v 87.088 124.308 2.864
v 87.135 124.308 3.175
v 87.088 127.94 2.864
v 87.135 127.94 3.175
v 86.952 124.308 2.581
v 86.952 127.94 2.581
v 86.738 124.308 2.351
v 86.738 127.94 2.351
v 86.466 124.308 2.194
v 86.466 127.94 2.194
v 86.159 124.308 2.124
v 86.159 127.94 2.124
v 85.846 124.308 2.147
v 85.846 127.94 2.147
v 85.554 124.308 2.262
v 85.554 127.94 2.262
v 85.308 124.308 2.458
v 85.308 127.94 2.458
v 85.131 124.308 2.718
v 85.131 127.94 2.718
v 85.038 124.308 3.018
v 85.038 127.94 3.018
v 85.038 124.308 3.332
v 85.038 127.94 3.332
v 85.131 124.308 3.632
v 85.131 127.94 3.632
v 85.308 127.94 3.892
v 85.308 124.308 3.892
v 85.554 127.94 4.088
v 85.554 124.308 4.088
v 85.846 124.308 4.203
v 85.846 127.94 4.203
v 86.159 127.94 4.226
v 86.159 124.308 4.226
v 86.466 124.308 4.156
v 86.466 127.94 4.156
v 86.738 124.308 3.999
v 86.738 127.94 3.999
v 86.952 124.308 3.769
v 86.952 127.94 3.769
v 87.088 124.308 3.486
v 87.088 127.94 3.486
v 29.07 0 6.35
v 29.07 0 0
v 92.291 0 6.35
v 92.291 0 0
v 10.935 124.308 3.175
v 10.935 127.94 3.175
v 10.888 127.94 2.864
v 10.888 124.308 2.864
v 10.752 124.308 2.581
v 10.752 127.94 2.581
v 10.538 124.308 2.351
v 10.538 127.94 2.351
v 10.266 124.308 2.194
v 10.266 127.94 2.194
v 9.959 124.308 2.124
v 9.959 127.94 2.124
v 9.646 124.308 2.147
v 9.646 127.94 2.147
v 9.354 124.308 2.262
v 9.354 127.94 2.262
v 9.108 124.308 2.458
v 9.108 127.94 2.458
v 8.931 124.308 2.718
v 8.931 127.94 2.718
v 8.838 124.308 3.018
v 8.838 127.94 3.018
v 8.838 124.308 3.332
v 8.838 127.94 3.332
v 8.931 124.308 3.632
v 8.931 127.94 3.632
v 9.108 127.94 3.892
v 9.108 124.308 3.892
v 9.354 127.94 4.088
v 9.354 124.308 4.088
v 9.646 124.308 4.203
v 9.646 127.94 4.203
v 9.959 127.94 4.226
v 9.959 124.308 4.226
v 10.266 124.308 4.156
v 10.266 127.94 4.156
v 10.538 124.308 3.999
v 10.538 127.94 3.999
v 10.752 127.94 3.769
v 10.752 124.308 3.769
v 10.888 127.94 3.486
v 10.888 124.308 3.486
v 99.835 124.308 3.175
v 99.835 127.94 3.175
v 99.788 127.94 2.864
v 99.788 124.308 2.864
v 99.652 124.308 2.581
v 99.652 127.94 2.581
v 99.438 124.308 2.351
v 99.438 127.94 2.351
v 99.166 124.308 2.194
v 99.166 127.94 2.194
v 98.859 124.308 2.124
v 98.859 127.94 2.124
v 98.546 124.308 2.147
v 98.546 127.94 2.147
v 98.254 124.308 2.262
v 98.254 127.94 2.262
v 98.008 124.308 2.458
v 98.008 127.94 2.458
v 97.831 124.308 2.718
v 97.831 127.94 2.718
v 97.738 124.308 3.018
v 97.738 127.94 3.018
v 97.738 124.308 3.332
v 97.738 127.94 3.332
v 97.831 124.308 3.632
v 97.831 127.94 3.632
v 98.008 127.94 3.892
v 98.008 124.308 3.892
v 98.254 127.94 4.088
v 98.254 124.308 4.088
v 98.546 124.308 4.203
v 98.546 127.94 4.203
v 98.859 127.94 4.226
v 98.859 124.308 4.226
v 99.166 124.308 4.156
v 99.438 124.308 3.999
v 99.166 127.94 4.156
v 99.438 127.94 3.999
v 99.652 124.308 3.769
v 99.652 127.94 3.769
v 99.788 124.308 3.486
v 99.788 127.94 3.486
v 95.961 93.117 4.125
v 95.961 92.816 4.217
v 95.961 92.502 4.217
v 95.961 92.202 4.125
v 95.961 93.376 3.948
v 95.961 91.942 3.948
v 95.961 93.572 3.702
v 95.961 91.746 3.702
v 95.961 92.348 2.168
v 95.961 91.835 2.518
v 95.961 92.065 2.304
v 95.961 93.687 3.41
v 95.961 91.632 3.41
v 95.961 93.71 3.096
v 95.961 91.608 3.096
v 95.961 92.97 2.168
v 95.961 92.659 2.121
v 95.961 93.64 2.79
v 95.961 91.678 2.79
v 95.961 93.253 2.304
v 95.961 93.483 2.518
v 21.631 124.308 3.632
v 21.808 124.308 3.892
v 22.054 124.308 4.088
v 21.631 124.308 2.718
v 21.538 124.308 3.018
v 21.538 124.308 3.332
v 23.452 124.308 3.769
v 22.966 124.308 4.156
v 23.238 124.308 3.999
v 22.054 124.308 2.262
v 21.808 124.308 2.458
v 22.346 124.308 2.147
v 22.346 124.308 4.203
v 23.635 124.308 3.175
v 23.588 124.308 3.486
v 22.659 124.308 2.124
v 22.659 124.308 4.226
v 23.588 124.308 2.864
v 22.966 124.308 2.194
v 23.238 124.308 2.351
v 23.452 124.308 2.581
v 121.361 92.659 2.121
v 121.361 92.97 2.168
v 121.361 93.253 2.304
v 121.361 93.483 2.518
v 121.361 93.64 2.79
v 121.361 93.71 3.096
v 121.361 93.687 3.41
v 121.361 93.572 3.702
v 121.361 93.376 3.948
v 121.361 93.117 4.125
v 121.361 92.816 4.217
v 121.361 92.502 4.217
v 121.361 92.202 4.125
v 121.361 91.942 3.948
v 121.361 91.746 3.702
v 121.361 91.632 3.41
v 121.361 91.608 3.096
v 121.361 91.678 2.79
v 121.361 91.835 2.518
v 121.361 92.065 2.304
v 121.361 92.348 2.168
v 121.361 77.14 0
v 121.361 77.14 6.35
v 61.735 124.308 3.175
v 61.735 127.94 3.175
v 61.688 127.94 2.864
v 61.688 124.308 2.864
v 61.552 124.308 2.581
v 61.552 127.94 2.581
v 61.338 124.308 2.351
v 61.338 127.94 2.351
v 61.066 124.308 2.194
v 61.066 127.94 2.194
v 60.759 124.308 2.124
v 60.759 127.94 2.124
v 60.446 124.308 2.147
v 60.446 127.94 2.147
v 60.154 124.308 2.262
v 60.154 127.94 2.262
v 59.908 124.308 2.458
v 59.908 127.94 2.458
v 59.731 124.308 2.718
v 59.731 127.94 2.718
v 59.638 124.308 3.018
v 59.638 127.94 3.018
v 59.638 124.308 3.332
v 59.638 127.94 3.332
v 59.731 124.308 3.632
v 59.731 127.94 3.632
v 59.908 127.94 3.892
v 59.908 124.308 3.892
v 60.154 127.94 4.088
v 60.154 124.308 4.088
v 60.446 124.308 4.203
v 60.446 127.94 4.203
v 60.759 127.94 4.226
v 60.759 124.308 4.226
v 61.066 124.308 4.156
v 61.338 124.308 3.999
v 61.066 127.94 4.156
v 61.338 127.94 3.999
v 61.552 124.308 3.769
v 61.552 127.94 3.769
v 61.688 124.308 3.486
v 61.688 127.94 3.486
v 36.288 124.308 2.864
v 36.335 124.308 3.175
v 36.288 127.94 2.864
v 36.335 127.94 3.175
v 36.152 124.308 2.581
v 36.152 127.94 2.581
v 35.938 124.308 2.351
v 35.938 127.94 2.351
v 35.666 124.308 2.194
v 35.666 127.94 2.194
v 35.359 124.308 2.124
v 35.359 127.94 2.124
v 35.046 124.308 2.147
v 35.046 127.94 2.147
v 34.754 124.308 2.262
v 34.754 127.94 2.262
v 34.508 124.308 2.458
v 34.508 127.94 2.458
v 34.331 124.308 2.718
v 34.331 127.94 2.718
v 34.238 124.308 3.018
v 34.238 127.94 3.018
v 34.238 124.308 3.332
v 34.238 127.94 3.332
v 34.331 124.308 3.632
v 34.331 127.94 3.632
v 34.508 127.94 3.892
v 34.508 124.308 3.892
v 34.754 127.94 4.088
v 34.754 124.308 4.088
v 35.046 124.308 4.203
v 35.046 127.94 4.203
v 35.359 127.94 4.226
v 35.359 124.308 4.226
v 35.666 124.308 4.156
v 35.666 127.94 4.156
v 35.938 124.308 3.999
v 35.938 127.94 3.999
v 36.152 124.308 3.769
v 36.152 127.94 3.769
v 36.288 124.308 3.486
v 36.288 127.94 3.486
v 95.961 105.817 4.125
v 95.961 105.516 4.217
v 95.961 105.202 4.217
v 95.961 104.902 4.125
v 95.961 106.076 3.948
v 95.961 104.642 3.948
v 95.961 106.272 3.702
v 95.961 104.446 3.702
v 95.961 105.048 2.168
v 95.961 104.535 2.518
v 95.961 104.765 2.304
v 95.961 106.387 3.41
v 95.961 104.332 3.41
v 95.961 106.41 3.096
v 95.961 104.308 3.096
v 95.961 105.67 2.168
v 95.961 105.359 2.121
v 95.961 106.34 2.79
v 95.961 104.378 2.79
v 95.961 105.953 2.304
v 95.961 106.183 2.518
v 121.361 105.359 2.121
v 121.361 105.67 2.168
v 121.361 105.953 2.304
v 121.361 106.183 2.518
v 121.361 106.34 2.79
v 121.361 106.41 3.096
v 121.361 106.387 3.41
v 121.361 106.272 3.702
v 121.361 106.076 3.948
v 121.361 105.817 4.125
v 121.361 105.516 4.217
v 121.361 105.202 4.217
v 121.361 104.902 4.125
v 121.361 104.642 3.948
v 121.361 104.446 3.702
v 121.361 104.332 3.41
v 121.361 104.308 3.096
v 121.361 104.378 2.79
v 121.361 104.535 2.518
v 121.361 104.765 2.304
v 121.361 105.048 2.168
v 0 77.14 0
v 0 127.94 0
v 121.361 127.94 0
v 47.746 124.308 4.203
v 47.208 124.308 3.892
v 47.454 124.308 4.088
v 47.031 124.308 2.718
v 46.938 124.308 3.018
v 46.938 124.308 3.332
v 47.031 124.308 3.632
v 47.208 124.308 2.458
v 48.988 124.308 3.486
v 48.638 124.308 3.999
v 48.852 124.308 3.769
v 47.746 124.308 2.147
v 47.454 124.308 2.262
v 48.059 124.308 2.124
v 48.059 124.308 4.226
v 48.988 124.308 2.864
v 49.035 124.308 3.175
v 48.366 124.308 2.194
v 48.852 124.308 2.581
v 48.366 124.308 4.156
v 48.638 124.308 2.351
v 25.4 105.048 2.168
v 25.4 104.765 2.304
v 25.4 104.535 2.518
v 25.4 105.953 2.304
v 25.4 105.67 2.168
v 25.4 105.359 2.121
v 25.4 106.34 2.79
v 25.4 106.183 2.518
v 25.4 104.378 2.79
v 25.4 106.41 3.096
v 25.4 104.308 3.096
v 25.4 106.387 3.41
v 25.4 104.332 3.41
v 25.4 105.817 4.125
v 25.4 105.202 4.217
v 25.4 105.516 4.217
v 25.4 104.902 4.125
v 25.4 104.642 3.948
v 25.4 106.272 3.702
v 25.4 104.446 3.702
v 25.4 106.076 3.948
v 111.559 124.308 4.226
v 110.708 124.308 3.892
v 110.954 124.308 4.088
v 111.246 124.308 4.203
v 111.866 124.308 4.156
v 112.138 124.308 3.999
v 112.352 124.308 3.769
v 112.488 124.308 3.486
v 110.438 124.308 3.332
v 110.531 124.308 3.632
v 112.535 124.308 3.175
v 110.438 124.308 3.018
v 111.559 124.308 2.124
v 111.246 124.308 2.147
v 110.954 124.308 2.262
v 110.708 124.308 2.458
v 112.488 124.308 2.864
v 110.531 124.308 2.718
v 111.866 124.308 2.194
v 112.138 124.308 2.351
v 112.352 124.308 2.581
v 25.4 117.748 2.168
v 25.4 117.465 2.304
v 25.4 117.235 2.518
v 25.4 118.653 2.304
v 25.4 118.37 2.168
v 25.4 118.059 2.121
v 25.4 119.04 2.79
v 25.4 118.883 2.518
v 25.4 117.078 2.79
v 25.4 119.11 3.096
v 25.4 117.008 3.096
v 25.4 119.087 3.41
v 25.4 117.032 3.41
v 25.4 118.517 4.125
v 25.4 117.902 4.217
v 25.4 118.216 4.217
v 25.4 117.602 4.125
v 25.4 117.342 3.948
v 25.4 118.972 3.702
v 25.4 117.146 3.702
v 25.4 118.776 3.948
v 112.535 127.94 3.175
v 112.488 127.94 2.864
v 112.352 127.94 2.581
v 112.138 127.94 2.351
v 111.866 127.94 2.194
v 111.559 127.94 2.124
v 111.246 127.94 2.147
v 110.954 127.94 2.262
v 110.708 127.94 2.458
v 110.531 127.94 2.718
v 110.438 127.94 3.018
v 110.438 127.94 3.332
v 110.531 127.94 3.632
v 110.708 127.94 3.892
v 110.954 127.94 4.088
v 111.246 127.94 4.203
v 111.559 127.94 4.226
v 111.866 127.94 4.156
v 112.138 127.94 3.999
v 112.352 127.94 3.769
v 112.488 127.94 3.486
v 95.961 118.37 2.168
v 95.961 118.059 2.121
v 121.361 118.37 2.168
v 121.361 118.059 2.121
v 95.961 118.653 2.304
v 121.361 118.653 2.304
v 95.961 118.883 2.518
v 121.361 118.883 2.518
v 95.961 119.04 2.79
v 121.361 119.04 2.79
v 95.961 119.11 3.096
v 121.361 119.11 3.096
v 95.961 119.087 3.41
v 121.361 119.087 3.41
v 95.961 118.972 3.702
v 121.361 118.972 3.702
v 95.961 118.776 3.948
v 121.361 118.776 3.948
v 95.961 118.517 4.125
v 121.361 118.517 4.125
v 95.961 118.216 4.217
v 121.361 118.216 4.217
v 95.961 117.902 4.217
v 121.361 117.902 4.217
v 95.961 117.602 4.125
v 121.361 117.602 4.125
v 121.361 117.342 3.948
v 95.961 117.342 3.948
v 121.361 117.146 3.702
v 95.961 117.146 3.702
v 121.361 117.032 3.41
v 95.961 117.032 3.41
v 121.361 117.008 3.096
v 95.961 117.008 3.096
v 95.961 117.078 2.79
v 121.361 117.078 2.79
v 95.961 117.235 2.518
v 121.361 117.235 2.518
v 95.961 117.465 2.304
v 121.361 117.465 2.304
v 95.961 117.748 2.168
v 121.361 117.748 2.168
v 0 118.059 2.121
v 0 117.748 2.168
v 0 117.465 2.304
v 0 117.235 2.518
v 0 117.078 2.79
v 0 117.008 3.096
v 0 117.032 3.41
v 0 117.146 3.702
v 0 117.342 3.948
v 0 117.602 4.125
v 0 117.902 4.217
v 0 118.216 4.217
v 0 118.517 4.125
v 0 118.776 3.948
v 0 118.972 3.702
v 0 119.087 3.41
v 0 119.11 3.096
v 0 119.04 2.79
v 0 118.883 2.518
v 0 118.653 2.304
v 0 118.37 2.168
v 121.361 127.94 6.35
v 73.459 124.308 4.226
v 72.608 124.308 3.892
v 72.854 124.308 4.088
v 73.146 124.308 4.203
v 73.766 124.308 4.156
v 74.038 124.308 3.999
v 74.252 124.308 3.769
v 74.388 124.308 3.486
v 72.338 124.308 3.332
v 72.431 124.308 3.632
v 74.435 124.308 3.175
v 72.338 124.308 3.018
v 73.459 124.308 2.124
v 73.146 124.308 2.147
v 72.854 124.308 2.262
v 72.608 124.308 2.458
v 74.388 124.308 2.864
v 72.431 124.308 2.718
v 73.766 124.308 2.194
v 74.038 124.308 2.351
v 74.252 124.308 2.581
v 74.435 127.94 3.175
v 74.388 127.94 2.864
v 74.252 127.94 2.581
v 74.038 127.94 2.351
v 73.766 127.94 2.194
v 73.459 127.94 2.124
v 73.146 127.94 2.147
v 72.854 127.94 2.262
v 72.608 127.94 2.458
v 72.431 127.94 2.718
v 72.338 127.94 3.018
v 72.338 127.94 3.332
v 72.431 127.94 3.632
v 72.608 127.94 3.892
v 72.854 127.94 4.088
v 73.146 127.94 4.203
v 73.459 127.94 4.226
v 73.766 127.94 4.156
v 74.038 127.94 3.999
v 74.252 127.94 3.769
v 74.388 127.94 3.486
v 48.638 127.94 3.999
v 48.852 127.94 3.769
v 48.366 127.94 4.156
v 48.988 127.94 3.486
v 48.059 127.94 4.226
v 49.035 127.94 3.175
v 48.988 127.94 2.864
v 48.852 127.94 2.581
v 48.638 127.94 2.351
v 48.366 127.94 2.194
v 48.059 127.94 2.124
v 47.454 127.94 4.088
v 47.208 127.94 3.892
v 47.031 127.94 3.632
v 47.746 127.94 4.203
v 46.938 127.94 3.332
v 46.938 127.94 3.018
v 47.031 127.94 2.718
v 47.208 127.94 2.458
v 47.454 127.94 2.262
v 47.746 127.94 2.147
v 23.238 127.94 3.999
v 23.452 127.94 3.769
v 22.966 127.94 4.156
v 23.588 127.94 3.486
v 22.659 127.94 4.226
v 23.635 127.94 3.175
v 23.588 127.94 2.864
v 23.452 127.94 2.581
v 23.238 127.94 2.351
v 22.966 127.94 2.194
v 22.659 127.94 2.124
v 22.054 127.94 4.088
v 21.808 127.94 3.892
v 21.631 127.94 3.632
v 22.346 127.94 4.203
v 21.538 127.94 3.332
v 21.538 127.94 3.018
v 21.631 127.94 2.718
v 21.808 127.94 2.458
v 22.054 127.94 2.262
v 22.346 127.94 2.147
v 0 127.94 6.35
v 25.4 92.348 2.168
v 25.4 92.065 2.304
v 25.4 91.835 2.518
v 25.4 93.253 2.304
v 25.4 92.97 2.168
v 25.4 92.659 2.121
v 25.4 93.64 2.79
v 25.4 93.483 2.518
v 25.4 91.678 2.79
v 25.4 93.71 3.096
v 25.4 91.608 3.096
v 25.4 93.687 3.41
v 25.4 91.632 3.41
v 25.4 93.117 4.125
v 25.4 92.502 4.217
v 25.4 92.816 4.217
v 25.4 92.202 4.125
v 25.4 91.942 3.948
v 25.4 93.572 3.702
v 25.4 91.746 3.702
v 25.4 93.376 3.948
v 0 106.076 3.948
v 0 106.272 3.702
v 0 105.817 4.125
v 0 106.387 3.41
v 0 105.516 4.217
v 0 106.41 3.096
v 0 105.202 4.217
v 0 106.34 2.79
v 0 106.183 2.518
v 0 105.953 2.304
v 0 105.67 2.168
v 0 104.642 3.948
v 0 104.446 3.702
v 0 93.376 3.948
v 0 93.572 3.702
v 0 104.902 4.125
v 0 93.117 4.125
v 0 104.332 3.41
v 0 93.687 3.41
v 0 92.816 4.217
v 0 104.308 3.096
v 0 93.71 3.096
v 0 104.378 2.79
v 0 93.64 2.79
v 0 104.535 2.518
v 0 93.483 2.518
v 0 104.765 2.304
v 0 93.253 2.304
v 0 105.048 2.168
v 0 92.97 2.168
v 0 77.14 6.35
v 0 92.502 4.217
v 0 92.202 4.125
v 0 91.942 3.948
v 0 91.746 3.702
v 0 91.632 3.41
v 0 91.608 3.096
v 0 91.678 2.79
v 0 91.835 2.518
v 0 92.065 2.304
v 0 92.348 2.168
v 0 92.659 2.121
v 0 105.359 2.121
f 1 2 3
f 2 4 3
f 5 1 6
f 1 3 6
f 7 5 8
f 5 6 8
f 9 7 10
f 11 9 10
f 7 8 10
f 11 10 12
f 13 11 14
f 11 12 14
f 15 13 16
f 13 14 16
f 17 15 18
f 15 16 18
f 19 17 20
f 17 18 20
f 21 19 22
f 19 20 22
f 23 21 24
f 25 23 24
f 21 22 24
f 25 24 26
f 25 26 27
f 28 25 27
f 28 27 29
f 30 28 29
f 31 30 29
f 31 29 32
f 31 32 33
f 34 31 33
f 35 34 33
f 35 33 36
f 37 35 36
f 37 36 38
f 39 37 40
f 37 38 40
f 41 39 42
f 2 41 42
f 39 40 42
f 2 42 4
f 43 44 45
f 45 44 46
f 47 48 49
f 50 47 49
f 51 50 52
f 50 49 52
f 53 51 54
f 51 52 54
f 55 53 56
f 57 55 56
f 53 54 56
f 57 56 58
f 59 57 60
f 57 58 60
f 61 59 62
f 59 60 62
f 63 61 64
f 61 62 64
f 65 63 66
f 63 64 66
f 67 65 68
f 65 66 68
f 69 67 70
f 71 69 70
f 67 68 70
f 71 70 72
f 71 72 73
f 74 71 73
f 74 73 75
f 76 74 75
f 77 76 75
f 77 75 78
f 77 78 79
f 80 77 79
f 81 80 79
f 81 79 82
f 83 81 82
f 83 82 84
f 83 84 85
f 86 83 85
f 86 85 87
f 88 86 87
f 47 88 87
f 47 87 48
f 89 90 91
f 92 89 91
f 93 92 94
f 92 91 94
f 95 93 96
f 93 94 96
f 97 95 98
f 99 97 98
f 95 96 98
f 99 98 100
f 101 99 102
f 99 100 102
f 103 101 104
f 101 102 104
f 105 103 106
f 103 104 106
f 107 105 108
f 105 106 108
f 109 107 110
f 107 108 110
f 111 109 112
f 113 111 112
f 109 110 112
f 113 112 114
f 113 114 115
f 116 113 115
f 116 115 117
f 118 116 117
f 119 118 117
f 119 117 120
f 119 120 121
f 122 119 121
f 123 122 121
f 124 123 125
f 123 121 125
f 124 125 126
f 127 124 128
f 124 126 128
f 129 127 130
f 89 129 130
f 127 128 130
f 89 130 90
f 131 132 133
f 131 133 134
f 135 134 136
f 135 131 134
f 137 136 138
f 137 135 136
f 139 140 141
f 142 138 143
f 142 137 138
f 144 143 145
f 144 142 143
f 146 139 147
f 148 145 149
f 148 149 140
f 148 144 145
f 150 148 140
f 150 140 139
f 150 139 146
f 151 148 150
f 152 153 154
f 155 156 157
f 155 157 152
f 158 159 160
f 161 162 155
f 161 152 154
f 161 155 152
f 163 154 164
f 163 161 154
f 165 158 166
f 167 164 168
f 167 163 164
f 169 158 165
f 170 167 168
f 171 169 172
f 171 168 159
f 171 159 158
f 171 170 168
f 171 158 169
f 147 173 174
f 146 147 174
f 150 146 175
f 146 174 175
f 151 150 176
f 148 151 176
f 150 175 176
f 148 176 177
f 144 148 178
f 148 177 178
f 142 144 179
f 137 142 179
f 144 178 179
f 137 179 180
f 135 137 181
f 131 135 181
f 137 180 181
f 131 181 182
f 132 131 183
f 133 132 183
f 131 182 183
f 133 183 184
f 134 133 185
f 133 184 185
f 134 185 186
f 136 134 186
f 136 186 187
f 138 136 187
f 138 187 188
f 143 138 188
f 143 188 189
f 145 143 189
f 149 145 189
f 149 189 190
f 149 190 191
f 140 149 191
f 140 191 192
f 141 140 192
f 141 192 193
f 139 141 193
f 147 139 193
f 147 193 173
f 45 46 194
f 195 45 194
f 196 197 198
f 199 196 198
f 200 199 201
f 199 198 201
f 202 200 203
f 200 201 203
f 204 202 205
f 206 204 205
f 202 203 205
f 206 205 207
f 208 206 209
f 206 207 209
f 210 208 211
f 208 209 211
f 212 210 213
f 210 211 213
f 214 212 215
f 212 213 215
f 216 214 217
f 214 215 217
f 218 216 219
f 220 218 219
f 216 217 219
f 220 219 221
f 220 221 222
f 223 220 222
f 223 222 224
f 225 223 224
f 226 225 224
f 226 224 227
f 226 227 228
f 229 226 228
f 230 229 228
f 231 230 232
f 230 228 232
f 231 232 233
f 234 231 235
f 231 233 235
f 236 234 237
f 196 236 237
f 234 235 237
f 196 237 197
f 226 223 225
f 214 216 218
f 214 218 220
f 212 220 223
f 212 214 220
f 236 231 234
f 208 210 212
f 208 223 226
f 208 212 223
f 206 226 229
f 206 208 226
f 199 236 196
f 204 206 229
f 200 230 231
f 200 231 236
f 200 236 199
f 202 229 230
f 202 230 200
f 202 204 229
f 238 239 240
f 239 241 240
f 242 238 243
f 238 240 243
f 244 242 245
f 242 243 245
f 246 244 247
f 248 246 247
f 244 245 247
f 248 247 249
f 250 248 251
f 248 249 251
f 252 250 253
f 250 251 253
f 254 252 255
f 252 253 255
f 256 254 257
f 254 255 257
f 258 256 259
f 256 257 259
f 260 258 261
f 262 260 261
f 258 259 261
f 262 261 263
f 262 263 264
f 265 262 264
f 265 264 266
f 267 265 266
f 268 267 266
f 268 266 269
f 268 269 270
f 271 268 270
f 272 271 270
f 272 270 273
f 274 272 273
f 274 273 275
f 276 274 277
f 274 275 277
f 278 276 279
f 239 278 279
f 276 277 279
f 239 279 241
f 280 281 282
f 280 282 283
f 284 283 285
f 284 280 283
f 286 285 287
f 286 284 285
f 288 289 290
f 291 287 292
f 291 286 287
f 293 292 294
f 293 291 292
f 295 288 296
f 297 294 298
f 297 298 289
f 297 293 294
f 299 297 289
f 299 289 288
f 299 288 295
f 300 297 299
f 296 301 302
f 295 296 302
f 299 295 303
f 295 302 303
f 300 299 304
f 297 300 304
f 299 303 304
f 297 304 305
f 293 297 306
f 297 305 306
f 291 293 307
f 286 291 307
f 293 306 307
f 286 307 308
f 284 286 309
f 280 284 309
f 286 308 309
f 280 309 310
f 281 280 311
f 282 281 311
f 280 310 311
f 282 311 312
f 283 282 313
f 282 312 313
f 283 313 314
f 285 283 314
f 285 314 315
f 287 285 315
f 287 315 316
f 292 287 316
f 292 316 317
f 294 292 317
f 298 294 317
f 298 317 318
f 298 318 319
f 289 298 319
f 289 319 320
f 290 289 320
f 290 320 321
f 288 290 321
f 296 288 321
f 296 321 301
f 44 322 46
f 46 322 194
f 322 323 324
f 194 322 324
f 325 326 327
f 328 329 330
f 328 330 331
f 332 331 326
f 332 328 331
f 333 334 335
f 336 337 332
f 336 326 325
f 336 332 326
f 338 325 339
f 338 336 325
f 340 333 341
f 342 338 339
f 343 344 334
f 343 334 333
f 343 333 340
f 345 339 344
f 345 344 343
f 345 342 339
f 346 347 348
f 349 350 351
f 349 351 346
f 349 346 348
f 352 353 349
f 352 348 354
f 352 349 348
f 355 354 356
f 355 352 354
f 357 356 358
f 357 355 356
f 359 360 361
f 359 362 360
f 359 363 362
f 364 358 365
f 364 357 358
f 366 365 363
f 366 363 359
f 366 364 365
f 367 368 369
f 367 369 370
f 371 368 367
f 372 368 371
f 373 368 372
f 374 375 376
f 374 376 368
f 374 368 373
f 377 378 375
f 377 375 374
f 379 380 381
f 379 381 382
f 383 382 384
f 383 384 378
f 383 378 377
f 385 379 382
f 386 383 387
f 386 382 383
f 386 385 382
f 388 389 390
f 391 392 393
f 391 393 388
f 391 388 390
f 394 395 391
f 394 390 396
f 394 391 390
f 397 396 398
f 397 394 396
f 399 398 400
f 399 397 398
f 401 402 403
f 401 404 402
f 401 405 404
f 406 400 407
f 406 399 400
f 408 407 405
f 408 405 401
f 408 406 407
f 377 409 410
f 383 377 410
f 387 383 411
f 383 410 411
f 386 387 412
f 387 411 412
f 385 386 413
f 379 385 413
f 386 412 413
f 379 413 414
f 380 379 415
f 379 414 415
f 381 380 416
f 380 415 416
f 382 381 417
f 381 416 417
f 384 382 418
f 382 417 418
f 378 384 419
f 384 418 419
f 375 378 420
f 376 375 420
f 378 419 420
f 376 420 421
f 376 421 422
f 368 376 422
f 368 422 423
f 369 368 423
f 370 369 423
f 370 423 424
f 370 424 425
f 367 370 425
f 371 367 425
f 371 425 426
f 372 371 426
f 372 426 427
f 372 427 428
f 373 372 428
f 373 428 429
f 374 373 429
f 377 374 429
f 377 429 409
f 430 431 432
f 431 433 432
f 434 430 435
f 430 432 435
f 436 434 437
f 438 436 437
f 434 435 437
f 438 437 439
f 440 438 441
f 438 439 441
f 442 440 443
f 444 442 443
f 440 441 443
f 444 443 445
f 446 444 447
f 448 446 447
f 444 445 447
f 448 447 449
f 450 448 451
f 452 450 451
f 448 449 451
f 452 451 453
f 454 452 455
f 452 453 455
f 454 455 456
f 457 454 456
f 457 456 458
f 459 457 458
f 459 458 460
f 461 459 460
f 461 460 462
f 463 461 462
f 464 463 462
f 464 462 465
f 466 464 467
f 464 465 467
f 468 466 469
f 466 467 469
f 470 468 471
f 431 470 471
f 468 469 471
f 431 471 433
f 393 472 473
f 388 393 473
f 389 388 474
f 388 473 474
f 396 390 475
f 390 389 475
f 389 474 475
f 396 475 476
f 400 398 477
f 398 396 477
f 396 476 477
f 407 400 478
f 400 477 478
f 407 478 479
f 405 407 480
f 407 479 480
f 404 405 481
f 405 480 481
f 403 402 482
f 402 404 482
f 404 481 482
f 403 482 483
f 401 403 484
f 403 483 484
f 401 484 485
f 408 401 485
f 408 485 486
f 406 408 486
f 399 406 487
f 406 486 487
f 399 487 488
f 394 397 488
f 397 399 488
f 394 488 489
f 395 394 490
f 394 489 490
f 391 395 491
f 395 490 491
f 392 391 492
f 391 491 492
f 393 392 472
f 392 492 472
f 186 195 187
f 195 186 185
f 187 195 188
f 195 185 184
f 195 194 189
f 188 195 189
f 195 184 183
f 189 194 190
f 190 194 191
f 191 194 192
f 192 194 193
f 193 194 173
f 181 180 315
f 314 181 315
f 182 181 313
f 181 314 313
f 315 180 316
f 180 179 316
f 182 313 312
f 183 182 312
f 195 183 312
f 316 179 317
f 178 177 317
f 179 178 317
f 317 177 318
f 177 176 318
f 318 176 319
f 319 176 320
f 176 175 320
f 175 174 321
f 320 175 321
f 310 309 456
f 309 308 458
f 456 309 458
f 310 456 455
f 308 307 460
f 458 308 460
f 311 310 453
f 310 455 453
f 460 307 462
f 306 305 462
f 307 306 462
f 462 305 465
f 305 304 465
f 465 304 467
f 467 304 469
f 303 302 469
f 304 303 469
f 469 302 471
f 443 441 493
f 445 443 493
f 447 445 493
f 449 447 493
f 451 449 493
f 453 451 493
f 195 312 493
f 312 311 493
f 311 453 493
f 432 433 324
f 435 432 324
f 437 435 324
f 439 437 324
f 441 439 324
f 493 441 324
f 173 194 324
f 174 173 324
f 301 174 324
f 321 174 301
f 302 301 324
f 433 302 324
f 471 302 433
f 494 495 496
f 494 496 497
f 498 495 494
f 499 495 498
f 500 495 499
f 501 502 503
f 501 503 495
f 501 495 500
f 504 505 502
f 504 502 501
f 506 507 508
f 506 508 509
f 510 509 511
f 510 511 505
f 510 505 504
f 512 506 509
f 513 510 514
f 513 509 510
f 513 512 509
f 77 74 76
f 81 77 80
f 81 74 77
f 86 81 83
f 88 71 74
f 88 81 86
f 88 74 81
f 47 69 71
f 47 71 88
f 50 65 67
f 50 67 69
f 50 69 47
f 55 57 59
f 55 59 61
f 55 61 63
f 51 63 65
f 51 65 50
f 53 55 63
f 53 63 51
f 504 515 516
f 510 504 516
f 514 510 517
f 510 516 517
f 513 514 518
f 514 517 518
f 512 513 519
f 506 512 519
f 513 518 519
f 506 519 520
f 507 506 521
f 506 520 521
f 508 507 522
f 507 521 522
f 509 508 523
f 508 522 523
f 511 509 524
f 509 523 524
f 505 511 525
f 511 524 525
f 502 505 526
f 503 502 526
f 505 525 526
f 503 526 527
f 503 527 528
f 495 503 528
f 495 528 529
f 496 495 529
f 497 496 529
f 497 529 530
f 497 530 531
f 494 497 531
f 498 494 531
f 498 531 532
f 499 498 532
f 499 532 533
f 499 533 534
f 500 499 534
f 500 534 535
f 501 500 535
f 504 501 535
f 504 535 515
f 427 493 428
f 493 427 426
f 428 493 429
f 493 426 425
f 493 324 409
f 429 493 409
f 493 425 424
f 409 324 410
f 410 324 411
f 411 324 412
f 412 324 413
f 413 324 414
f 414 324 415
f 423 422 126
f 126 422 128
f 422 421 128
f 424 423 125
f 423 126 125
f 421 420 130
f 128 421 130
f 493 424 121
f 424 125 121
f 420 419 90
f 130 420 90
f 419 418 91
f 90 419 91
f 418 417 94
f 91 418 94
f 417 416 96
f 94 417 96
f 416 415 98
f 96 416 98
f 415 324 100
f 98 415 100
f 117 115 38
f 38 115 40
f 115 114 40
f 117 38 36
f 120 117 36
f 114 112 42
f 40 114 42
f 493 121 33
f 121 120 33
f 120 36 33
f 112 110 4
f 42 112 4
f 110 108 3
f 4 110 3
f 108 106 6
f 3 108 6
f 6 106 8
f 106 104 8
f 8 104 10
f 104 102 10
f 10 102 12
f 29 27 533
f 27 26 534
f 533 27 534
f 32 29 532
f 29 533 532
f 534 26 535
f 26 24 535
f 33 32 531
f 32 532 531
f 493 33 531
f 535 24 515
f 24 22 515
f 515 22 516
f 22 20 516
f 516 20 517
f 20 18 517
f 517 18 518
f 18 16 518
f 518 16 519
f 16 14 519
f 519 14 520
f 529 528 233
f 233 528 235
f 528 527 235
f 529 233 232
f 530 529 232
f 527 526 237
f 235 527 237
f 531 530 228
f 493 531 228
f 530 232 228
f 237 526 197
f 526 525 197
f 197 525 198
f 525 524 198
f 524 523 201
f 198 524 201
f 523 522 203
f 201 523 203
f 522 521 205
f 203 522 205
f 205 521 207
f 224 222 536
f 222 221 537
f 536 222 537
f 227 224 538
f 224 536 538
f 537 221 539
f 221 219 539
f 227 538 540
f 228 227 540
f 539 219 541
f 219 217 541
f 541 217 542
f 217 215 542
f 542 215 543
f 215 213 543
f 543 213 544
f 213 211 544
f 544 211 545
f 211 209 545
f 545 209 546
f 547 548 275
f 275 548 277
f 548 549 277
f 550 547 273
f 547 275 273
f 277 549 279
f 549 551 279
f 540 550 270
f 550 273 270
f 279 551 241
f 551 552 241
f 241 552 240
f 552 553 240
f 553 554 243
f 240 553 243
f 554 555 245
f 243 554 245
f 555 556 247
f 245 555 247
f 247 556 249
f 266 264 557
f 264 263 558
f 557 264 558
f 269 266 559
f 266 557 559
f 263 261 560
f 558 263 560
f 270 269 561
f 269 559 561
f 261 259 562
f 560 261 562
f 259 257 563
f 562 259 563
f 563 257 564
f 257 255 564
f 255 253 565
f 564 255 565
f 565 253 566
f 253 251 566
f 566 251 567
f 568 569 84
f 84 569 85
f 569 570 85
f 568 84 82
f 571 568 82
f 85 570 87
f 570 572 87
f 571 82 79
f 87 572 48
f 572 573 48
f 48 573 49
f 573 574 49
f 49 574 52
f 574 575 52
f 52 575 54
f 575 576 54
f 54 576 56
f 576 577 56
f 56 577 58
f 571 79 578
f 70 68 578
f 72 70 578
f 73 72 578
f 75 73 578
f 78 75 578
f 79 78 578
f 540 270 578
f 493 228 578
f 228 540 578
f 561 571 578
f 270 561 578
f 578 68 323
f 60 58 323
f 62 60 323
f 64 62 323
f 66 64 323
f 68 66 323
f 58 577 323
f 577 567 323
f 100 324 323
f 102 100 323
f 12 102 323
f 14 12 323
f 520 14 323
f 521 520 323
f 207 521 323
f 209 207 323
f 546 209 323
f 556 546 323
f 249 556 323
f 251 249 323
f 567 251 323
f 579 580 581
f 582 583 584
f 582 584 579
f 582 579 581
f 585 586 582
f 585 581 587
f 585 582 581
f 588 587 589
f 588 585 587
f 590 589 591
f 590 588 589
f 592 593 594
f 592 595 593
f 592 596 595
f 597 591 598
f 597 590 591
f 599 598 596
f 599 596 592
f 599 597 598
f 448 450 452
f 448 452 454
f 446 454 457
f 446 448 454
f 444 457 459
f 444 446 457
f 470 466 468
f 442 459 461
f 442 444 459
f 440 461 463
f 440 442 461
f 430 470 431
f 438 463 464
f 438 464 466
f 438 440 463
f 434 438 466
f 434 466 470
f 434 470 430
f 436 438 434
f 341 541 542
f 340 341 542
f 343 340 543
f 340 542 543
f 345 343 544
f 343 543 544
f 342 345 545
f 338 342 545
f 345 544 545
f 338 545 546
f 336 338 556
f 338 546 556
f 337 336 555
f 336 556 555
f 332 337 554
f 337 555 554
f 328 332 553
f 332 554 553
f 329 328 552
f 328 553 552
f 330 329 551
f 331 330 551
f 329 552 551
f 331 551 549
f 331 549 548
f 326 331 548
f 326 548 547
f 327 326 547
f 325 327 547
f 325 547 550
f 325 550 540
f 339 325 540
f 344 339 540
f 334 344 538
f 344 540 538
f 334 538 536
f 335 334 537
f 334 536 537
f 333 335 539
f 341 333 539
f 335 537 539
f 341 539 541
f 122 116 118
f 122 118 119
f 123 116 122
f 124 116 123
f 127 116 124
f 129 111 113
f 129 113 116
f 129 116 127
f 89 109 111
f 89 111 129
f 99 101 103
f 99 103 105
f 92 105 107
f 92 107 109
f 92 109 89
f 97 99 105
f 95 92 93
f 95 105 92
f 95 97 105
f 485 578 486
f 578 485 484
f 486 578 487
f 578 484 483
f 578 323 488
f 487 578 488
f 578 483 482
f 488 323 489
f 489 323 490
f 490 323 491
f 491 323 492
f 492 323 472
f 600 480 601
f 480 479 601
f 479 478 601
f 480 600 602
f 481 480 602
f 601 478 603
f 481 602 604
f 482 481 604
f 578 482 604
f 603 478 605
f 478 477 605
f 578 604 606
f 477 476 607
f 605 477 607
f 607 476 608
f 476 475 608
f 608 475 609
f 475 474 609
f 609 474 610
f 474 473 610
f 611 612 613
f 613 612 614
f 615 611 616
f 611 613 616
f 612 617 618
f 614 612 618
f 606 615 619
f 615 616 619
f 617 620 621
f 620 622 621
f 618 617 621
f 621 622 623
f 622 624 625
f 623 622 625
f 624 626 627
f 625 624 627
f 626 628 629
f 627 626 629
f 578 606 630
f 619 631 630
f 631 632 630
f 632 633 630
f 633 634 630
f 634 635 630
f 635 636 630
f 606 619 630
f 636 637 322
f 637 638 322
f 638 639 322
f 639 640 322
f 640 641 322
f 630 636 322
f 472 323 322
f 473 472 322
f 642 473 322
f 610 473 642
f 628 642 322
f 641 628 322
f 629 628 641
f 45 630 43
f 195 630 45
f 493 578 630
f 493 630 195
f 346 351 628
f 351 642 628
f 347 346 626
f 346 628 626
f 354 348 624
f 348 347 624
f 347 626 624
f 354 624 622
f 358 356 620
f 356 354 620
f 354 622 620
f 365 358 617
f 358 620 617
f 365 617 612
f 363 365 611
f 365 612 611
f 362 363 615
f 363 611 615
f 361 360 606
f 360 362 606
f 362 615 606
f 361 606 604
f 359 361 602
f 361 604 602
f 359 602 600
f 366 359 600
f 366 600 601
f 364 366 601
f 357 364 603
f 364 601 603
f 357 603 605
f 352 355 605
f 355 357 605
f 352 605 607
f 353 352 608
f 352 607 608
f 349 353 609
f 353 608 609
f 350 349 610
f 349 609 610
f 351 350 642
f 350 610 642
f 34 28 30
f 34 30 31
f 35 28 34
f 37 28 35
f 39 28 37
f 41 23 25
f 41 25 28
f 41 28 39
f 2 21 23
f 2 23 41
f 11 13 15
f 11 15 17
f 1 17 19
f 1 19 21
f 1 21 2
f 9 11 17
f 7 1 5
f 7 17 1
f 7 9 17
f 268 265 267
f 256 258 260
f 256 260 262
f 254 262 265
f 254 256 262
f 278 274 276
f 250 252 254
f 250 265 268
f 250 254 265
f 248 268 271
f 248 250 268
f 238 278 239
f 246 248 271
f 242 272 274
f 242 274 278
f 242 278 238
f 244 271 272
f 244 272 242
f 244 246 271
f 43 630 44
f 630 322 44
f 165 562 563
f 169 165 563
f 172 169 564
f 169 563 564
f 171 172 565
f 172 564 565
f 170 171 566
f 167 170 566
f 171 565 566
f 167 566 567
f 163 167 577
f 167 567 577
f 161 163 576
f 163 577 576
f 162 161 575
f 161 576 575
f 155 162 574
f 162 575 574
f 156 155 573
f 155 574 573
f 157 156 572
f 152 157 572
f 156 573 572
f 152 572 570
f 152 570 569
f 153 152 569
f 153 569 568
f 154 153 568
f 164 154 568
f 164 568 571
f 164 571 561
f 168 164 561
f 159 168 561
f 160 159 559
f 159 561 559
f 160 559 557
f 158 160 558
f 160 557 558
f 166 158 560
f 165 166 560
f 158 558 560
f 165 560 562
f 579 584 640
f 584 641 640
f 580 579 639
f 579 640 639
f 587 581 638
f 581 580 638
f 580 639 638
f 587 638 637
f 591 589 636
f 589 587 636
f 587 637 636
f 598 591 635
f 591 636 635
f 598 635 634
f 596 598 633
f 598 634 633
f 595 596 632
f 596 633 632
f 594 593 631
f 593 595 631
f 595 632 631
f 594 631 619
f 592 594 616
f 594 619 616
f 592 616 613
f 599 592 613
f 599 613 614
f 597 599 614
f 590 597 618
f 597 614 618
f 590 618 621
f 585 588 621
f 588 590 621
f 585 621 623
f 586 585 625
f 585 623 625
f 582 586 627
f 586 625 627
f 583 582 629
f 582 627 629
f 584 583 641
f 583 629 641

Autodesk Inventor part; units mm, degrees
ref_plane "YZ Plane" through (0, 0, 0) normal (1, 0, 0) x (0, 1, 0)
ref_plane "XZ Plane" through (0, 0, 0) normal (0, 1, 0) x (-1, 0, 0)
sketch "Sketch1" plane through (0, 0, 0) normal (0, 0, 1) x (1, 0, 0)
  line L0 (29.0703, 0) -> (121.3612, 0)
  line L1 (121.3612, 0) -> (121.3612, 127.9398)
  line L2 (121.3612, 127.9398) -> (0, 127.9398)
  line L3 (0, 127.9398) -> (0, 13.0299)
  line L4 (0, 77.1398) -> (121.3612, 77.1398) construction
  line L5 (29.0703, 0) -> (29.0703, 26.0597) construction
  line L6 (92.2909, 0) -> (92.2909, 26.0597) construction
  line L7 (29.0703, 13.0299) -> (0, 13.0299) construction
  line L8 (92.2909, 13.0299) -> (121.3612, 13.0299) construction
  line L9 (0, 77.1398) -> (29.0703, 0)
  line L10 (92.2909, 0) -> (121.3612, 77.1398)
  point P0 (0, 0)
  dimension "d0" = 121.3612
  dimension "d1" = 127.9398
  dimension "d2" = 50.8
  dimension "d3" = 63.2206
extrude "Extrusion1" add sketch "Sketch1" along normal blind 6.35 contours L9 L3 L2 L1 L10 L0
sketch "Sketch2" plane through (0, 127.9398, 0) normal (0, 1, 0) x (1, 0, 0)
  line L0 (121.3612, 0) -> (0, 0) construction
  line L1 (0, 0) -> (0, -6.35) construction
  line L2 (121.3612, -6.35) -> (0, -6.35) construction
  line L3 (121.3612, 0) -> (121.3612, -6.35) construction
  line L4 (121.3612, -6.35) -> (0, -6.35) construction
  line L5 (60.6806, -6.35) -> (60.6806, 0) construction
  line L6 (121.3612, 0) -> (0, 0) construction
  circle A0 centre (60.6806, -3.175) radius 1.0541
  circle A1 centre (47.9806, -3.175) radius 1.0541
  circle A2 centre (35.2806, -3.175) radius 1.0541
  circle A3 centre (22.5806, -3.175) radius 1.0541
  circle A4 centre (9.8806, -3.175) radius 1.0541
  circle A5 centre (60.6806, -3.175) radius 1.0541
  circle A6 centre (73.3806, -3.175) radius 1.0541
  circle A7 centre (86.0806, -3.175) radius 1.0541
  circle A8 centre (98.7806, -3.175) radius 1.0541
  circle A9 centre (111.4806, -3.175) radius 1.0541
  dimension "d6" = 2.1082
  dimension "d9" = 12.7
extrude "Extrusion2" cut sketch "Sketch2" against normal blind 3.6322
sketch "Sketch3" plane through (121.3612, 77.1398, 0) normal (1, 0, 0) x (0, 0, -1)
  line L0 (0, 0) -> (0, 50.8) construction
  line L1 (0, 50.8) -> (-6.35, 50.8) construction
  line L2 (-6.35, 0) -> (-6.35, 50.8) construction
  line L3 (0, 0) -> (-6.35, 0) construction
  line L4 (0, 50.8) -> (-6.35, 50.8) construction
  line L5 (-3.175, 50.8) -> (-3.175, 0) construction
  line L6 (0, 0) -> (-6.35, 0) construction
  circle A0 centre (-3.175, 40.9194) radius 1.0541
  point P0 (0, -77.1398)
  dimension "d16" = 2.1082
  dimension "d17" = 9.8806
extrude "Extrusion3" cut sketch "Sketch3" against normal blind 25.4
pattern_linear "Rectangular Pattern1" count 3 spacing 12.7 along (0, -1, 0) of "Extrusion3"
ref_plane "Work Plane1" through (60.6806, 127.9398, 0) normal (1, 0, 0) x (0, 0, 1)
mirror "Mirror1" about plane through (60.6806, 127.9398, 0) normal (1, 0, 0) of "Extrusion3", "Rectangular Pattern1"
properties part number "top"
